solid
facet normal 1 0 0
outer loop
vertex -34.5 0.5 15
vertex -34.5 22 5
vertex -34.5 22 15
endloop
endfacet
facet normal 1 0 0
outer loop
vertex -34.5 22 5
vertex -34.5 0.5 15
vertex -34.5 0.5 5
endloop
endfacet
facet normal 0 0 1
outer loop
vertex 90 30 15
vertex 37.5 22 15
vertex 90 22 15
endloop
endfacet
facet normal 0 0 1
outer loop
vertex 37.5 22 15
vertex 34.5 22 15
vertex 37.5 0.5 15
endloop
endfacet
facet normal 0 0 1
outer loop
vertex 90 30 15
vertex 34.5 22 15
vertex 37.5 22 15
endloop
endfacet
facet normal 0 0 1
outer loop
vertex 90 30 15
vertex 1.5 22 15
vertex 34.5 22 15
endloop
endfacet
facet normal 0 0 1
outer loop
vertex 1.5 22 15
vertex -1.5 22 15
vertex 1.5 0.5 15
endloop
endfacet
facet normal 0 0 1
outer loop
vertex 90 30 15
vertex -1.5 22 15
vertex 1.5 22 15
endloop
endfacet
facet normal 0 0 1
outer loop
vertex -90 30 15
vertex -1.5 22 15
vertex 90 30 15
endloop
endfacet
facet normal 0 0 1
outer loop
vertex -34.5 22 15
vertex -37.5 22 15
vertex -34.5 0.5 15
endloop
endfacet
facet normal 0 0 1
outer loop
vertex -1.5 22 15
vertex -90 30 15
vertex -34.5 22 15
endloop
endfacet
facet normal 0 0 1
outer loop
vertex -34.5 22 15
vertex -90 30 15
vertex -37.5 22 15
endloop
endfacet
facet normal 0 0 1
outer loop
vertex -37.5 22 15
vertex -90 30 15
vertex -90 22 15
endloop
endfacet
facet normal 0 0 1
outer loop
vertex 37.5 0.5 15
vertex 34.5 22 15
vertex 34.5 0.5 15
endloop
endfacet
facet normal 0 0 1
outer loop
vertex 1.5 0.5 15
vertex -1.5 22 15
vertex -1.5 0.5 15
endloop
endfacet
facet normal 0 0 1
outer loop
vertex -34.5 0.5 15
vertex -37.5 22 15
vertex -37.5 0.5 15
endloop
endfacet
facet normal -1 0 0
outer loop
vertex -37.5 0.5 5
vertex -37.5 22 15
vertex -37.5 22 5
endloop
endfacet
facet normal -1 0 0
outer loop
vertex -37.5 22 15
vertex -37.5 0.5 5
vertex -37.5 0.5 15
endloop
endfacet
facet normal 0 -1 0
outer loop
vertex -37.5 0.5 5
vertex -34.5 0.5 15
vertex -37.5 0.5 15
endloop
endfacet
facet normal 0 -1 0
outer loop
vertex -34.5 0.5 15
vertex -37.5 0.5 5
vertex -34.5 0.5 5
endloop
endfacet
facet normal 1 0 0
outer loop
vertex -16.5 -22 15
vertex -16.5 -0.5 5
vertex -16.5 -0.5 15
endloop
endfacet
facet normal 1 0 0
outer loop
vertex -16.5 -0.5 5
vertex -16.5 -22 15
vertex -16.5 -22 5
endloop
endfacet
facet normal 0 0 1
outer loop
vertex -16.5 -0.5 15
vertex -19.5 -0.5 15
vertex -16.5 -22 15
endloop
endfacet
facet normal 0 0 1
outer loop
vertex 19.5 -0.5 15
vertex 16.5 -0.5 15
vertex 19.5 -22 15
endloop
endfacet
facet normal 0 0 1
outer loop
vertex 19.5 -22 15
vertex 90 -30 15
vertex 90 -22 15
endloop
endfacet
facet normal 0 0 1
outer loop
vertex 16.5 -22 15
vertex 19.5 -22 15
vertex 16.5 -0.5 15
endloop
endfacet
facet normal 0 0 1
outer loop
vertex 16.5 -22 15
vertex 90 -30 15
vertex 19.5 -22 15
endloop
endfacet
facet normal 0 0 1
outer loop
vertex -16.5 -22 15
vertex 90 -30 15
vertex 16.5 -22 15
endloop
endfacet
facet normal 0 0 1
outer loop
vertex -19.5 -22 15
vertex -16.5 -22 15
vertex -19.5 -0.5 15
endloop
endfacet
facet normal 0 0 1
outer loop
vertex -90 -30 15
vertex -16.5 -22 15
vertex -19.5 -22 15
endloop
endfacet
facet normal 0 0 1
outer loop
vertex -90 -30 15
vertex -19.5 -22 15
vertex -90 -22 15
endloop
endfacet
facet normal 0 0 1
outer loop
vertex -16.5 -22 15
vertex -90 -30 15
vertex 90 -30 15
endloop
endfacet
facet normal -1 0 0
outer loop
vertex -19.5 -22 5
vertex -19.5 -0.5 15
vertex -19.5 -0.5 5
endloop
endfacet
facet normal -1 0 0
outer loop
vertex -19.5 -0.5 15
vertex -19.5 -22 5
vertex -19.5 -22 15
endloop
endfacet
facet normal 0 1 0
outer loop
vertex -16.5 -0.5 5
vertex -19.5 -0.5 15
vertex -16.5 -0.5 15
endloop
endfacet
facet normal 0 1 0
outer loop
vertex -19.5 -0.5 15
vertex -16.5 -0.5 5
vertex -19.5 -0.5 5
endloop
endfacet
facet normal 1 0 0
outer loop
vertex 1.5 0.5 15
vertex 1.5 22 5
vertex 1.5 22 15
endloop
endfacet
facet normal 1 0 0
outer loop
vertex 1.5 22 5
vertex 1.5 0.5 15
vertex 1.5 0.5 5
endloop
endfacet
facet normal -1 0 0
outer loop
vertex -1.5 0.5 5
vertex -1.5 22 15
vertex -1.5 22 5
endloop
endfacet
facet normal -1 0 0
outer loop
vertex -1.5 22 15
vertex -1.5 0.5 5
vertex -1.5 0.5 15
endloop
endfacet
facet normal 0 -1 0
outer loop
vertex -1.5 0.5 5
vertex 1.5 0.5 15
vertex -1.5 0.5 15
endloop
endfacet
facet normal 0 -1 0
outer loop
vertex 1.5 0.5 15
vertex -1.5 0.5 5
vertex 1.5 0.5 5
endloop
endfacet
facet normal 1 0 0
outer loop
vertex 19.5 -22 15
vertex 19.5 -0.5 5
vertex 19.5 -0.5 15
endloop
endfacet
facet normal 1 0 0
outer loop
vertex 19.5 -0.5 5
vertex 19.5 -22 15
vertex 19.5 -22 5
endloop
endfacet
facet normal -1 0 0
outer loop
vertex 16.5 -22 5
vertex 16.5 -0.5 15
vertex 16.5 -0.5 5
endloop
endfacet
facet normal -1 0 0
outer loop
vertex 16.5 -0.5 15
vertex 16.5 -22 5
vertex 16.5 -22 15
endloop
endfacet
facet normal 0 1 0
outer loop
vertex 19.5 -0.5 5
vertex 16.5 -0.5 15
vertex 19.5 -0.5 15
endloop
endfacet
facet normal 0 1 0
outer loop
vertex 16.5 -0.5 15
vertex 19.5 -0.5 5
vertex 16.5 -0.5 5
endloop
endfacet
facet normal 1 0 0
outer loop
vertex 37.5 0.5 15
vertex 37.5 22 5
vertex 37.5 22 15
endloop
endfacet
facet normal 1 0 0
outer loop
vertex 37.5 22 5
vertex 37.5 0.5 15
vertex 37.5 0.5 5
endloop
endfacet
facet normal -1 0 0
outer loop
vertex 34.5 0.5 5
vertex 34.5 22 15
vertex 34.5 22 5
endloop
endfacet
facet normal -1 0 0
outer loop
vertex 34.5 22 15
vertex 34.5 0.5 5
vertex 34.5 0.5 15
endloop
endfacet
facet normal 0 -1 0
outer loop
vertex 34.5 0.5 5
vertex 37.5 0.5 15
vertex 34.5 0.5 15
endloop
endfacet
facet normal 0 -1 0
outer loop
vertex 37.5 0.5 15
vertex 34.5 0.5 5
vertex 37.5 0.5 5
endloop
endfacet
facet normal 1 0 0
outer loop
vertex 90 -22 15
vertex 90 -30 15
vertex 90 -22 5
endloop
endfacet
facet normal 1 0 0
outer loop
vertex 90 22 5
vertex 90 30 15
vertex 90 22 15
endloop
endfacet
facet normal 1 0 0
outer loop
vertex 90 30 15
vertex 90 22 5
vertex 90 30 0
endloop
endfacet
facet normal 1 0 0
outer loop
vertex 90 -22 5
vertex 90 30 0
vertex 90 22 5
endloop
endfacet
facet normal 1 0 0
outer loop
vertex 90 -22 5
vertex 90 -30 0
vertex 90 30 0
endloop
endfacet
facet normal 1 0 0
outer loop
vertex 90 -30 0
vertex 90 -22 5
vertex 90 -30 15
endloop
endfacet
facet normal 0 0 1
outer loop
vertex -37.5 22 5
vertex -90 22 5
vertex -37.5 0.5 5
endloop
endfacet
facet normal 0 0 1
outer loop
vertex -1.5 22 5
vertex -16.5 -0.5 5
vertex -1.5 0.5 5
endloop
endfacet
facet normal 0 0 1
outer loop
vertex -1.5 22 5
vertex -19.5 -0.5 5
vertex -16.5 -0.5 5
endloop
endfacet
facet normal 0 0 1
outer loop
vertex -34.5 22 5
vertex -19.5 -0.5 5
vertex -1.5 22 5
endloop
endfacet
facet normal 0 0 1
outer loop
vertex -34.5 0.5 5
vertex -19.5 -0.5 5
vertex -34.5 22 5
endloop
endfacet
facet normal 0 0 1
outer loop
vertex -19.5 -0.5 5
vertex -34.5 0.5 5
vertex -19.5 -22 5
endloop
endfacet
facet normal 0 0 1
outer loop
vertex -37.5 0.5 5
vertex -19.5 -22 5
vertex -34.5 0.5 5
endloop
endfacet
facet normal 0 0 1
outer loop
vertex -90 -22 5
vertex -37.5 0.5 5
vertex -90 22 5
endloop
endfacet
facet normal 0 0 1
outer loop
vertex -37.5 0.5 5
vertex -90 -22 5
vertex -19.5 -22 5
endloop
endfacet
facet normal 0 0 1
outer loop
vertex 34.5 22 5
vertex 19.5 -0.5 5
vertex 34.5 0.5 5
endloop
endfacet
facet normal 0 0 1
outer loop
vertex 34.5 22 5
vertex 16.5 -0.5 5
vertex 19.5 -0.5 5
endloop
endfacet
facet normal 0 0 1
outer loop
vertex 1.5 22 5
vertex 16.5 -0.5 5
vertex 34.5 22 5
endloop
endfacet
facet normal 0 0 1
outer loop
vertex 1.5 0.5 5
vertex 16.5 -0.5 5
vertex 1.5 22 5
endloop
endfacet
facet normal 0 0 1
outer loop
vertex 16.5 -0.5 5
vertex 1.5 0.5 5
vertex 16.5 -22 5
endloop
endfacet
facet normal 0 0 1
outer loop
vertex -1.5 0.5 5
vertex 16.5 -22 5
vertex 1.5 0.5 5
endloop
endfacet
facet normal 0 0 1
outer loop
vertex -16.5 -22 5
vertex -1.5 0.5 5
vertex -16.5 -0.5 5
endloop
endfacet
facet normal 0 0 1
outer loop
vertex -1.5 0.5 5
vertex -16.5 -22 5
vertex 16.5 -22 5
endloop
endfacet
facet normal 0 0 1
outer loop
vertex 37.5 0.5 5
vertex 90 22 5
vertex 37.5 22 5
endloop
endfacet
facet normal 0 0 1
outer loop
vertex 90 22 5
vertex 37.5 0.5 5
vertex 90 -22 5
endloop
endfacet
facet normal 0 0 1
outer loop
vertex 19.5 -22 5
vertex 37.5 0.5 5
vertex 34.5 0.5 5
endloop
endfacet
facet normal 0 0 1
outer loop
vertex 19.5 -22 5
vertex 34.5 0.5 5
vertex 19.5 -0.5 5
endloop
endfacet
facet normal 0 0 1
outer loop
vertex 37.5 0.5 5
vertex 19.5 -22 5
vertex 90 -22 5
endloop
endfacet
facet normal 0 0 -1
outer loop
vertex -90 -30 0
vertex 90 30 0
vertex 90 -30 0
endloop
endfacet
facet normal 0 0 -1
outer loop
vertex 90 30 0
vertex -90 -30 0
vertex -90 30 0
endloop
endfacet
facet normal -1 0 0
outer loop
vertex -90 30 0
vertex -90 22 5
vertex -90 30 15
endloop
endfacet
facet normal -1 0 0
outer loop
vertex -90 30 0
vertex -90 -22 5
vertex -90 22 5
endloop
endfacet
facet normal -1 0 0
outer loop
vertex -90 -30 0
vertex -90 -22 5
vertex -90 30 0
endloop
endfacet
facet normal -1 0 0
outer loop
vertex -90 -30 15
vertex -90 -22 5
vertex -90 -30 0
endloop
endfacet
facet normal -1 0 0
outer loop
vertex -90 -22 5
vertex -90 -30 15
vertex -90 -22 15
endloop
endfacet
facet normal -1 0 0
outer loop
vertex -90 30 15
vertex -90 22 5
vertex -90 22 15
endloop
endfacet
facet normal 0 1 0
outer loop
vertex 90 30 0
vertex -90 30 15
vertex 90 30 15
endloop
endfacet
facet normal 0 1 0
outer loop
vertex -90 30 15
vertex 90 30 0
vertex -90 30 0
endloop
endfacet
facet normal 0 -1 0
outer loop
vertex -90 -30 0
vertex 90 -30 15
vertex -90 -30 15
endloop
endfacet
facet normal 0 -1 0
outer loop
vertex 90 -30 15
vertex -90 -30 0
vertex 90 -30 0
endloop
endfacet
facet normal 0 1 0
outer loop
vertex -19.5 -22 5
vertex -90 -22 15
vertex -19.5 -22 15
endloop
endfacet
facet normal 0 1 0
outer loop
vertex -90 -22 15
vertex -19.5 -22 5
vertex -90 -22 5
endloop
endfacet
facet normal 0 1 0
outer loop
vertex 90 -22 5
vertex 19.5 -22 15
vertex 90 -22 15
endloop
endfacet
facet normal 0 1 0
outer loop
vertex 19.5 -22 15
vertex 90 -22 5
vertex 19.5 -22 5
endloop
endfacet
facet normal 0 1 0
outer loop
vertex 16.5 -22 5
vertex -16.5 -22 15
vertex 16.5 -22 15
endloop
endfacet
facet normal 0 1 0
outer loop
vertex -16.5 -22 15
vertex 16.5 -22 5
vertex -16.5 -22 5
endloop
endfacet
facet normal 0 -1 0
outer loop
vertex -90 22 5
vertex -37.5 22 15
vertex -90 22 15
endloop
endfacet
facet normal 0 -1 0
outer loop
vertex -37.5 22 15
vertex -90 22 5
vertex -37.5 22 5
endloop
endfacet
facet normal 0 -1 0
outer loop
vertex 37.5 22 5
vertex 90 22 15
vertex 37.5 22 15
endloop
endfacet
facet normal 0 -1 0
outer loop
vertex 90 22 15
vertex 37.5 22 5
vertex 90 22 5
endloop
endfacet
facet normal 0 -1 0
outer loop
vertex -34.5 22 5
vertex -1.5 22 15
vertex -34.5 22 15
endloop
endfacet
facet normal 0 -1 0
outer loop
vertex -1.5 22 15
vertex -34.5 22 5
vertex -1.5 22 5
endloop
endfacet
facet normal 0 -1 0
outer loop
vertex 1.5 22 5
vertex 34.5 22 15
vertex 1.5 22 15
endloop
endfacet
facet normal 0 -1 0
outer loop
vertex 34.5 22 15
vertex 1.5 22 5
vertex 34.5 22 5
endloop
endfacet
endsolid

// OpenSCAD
$fn = 32;

// ----------------------------------------------------------------------
// Rib frame 180 x 60 x 15
// 5 ribs at 18 mm pitch, staggered
// ----------------------------------------------------------------------

// --- parameters (mm) ---
frame = [180, 60, 5];  // base plate size (x, y, z)
rail_w = 8;            // side rail width
ribs = 5;              // number of ribs
rib_t = 3;             // rib thickness
rib_h = 10;            // rib height above the base plate
pitch = 18;            // pitch between rib centres

// --- derived feature positions (mm) ---
span = (ribs - 1) * pitch;          // = 72   distance between the outer ribs
origin_x = -span / 2;               // = -36   X of the first rib
rib_len = frame[1] / 2 - rail_w + 0.5;  // = 22.5   length of a staggered rib
rib_y = 0.5 + rib_len / 2;          // = 11.75   Y of a staggered rib centre
row_offset = 2 * rib_y;             // = 23.5   distance between the two rows
feature_centers = [
  [origin_x + 0 * pitch, rib_y],
  [origin_x + 1 * pitch, -rib_y],
  [origin_x + 2 * pitch, rib_y],
  [origin_x + 3 * pitch, -rib_y],
  [origin_x + 4 * pitch, rib_y]
];   // rib centre line, drives the rib loop

// base plate, two side rails, then the ribs read straight off feature_centers
union() {
  translate([-frame[0] / 2, -frame[1] / 2, 0]) cube(frame);
  translate([-frame[0] / 2, -frame[1] / 2, 0]) cube([frame[0], rail_w, frame[2] + rib_h]);
  translate([-frame[0] / 2, frame[1] / 2 - rail_w, 0]) cube([frame[0], rail_w, frame[2] + rib_h]);
  for (centre = feature_centers)
    translate([centre[0] - rib_t / 2, centre[1] - rib_len / 2, frame[2] - 1])
      cube([rib_t, rib_len, rib_h + 1]);
}
